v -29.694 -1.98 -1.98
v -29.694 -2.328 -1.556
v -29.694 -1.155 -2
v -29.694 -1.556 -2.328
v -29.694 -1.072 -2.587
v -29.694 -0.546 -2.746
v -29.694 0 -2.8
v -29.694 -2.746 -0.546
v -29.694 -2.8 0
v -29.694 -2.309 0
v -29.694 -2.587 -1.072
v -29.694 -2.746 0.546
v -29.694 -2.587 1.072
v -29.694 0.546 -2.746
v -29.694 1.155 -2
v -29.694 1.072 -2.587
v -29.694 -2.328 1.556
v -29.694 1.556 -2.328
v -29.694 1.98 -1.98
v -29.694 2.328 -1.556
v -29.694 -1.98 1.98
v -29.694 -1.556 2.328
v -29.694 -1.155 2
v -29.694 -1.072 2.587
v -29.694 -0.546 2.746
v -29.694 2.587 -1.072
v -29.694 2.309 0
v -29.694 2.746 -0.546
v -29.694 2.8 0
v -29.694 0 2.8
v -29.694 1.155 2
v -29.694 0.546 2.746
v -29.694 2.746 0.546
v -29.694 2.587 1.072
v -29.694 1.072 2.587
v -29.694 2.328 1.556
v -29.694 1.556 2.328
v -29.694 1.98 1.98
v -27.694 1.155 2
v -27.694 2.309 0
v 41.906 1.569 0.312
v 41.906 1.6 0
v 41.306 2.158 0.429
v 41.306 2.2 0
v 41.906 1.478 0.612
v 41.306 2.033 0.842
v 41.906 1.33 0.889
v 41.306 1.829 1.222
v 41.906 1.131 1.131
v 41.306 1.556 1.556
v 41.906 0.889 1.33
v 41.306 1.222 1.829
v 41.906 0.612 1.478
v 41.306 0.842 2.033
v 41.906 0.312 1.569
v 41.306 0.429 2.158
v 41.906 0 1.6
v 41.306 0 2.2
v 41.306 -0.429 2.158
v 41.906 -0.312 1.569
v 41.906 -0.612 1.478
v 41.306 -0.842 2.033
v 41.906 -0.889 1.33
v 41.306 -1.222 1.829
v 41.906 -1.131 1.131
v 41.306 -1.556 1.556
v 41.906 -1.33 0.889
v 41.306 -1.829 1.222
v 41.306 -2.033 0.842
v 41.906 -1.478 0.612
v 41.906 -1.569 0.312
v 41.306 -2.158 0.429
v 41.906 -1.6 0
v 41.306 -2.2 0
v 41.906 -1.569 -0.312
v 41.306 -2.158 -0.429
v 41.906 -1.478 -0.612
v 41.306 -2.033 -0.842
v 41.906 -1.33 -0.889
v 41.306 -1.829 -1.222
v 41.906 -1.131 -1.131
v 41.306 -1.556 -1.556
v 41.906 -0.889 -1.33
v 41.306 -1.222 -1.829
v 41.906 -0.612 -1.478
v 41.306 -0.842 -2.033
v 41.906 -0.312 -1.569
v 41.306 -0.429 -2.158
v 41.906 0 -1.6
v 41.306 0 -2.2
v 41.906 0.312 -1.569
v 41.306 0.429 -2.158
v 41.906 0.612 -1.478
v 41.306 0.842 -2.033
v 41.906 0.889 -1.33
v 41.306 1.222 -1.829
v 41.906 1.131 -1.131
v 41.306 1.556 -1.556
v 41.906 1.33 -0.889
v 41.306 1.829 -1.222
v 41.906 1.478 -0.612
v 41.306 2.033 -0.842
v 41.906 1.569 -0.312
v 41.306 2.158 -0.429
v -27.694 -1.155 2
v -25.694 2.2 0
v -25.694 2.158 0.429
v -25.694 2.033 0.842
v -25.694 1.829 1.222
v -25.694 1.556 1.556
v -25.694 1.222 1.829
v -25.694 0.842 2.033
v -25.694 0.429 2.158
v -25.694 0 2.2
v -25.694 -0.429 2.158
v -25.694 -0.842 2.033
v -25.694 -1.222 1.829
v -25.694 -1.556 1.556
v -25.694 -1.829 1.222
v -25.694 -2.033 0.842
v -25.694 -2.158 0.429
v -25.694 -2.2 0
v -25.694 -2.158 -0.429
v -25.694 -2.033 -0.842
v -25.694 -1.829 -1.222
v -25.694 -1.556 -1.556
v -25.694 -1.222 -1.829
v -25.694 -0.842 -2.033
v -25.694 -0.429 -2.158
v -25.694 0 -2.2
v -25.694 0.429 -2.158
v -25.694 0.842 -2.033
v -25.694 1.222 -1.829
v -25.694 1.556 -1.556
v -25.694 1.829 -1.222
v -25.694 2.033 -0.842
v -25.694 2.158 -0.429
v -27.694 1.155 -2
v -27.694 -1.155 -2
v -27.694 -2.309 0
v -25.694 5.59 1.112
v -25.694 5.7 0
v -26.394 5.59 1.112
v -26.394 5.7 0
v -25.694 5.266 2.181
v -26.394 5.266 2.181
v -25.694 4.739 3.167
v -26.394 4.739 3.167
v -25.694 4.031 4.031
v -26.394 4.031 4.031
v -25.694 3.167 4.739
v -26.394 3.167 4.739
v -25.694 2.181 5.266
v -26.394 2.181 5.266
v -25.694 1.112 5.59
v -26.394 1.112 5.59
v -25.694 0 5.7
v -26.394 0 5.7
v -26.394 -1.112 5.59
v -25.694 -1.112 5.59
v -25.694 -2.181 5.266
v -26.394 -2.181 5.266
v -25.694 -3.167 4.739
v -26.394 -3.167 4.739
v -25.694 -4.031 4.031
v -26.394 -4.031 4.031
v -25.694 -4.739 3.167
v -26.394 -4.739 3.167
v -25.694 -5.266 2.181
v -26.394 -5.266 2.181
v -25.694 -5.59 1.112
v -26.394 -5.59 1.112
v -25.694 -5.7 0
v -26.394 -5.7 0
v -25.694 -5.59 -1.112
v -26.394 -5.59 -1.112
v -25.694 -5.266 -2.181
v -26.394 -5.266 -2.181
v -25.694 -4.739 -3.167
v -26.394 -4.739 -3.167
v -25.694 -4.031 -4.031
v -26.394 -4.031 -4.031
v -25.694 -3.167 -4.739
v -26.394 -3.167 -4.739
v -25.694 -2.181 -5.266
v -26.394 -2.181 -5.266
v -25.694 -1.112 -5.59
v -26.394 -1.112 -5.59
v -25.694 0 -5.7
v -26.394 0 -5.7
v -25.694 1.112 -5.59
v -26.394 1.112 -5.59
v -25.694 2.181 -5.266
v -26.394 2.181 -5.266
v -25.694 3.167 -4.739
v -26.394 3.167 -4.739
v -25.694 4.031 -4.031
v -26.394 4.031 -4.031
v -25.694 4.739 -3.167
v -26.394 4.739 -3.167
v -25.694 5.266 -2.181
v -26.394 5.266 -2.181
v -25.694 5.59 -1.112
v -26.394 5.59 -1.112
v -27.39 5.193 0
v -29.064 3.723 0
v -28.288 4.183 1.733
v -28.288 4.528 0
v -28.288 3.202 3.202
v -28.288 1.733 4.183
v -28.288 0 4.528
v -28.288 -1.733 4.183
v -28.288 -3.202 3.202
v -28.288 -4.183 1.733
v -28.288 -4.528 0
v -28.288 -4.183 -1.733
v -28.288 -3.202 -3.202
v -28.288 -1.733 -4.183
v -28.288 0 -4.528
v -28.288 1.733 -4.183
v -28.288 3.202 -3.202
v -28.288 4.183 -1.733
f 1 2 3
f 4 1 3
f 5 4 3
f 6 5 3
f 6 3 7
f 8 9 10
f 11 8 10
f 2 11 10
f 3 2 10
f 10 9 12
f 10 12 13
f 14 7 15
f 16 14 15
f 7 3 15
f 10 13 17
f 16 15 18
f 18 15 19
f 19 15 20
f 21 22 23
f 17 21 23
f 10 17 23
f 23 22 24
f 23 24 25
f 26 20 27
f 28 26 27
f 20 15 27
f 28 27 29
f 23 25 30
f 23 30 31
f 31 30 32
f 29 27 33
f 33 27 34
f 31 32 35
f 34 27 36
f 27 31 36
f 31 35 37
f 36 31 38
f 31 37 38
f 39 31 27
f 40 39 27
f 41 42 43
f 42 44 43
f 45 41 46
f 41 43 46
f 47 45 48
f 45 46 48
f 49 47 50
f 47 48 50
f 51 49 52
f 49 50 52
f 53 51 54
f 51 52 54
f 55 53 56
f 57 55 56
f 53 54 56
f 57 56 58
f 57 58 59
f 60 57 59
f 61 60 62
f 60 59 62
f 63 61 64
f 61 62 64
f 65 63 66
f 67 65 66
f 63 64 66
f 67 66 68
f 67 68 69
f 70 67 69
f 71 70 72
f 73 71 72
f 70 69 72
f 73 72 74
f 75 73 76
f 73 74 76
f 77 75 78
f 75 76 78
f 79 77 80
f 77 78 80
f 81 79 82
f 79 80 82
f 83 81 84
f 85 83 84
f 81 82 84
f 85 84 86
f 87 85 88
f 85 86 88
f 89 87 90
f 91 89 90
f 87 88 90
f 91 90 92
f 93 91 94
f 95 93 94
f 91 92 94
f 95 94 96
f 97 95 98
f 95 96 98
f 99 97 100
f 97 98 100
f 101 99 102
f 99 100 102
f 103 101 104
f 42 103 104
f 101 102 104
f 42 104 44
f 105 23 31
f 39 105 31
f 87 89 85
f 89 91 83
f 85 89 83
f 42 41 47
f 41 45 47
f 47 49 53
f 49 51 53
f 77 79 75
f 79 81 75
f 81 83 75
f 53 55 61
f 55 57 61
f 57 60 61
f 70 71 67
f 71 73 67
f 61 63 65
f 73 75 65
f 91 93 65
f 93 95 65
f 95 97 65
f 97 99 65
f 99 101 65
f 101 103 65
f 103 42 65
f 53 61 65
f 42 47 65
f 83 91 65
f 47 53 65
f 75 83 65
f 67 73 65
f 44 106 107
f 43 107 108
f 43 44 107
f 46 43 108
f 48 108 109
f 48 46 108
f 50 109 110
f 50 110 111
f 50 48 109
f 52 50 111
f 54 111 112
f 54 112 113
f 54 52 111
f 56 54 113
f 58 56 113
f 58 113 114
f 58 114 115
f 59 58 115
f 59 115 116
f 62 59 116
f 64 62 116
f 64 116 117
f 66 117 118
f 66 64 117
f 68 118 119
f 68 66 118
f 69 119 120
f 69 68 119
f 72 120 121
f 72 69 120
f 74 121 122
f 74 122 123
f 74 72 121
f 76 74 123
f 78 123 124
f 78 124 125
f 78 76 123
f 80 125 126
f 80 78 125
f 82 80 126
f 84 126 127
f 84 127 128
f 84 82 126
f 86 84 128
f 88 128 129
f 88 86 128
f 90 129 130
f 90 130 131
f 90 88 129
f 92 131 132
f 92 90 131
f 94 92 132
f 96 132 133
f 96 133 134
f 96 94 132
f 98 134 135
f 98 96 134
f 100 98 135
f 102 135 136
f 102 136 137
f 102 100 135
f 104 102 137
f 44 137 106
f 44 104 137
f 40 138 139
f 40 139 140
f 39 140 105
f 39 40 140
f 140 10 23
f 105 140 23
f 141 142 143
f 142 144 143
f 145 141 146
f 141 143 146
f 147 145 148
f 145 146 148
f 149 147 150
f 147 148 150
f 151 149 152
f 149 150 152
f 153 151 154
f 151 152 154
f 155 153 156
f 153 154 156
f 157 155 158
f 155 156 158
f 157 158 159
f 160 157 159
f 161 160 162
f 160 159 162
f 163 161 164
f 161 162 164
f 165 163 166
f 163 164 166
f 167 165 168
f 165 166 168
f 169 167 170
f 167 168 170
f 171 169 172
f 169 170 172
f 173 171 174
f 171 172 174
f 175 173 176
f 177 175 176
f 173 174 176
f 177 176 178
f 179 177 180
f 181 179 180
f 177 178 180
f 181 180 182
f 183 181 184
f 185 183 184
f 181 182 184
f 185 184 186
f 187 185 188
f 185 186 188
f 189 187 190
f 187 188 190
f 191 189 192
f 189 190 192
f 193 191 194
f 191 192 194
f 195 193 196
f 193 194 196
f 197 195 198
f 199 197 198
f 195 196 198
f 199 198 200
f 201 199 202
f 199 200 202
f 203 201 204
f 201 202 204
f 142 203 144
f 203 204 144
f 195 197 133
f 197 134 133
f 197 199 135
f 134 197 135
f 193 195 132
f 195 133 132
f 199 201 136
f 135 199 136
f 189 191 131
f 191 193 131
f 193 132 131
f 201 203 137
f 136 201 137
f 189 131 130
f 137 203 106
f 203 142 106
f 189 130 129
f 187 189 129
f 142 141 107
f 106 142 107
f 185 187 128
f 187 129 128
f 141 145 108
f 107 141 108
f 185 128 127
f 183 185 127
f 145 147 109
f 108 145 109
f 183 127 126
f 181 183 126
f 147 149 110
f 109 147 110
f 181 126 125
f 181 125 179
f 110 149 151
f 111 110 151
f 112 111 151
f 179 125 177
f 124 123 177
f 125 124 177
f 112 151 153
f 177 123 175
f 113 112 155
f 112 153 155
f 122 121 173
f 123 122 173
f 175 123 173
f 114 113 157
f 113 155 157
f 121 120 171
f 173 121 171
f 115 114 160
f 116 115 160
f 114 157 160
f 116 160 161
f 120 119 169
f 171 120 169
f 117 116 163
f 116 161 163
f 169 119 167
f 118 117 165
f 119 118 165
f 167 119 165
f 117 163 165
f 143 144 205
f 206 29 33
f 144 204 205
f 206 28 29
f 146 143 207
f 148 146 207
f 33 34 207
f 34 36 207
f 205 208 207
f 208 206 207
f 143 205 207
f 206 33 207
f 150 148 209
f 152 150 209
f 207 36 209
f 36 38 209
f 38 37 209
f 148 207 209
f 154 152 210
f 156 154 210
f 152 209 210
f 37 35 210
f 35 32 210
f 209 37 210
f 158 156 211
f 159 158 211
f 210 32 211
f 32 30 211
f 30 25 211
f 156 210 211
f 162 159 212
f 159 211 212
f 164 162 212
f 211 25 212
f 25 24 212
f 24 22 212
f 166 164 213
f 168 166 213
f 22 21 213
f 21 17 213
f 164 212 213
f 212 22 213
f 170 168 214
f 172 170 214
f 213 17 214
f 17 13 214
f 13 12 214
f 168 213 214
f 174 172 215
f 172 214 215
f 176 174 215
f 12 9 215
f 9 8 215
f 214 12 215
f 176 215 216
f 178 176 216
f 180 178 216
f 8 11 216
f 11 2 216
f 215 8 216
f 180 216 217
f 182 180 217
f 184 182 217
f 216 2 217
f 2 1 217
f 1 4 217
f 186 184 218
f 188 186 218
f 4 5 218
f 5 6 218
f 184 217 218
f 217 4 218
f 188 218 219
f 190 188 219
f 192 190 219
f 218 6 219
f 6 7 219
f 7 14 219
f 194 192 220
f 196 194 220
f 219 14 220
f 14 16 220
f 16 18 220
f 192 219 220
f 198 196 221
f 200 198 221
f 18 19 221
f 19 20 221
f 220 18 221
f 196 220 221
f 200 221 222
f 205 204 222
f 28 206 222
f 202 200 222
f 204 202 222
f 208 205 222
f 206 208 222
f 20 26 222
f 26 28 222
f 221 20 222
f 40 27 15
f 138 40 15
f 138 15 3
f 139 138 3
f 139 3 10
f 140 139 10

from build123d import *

# Parameters (mm, degrees)
SKETCH1_W          = 33.5
SKETCH1_H          = 1.1
CUT_EXTRUDE1_DEPTH = 1
SCALE1_SCALE       = 2


with BuildPart() as part:
    # Sketch1 → Revolve1 (revolve)
    with BuildSketch(Plane.XY):
        with Locations((4.269842451, 0.55)):
            Rectangle(SKETCH1_W, SKETCH1_H)
        with BuildLine():
            Line((-12.830157549, 0), (-12.830157549, 2.85))
            ThreePointArc((-12.830157549, 2.85), (-13.77738043, 2.26408121), (-14.480157549, 1.4))
            Line((-14.480157549, 1.4), (-14.480157549, 0))
            Line((-14.480157549, 0), (-12.830157549, 0))
        make_face()
        Polygon((-12.480157549, 1.1), (-12.480157549, 2.85), (-12.830157549, 2.85), (-12.830157549, 0), (-12.480157549, 0), align=None)
        Polygon((21.319842451, 0.8), (21.019842451, 1.1), (21.019842451, 0), (21.319842451, 0), align=None)
    revolve(axis=Axis((-12.480157549, 0, 0), (1, 0, 0)))

    # Sketch2 → Cut-Extrude1 (cut)
    with BuildSketch(Plane.ZY.offset(14.480157549)):
        Polygon((0, 1.154700538), (-1, 0.577350269), (-1, -0.577350269), (0, -1.154700538), (1, -0.577350269), (1, 0.577350269), align=None)
    extrude(amount=-CUT_EXTRUDE1_DEPTH, mode=Mode.SUBTRACT)


with BuildPart() as part_1:
    # Scale1: scaled about (0.733669991, 0, 0)
    add(part.part.scale(SCALE1_SCALE).moved(Location((-0.733669991, 0, 0))))


solid = part_1.part
